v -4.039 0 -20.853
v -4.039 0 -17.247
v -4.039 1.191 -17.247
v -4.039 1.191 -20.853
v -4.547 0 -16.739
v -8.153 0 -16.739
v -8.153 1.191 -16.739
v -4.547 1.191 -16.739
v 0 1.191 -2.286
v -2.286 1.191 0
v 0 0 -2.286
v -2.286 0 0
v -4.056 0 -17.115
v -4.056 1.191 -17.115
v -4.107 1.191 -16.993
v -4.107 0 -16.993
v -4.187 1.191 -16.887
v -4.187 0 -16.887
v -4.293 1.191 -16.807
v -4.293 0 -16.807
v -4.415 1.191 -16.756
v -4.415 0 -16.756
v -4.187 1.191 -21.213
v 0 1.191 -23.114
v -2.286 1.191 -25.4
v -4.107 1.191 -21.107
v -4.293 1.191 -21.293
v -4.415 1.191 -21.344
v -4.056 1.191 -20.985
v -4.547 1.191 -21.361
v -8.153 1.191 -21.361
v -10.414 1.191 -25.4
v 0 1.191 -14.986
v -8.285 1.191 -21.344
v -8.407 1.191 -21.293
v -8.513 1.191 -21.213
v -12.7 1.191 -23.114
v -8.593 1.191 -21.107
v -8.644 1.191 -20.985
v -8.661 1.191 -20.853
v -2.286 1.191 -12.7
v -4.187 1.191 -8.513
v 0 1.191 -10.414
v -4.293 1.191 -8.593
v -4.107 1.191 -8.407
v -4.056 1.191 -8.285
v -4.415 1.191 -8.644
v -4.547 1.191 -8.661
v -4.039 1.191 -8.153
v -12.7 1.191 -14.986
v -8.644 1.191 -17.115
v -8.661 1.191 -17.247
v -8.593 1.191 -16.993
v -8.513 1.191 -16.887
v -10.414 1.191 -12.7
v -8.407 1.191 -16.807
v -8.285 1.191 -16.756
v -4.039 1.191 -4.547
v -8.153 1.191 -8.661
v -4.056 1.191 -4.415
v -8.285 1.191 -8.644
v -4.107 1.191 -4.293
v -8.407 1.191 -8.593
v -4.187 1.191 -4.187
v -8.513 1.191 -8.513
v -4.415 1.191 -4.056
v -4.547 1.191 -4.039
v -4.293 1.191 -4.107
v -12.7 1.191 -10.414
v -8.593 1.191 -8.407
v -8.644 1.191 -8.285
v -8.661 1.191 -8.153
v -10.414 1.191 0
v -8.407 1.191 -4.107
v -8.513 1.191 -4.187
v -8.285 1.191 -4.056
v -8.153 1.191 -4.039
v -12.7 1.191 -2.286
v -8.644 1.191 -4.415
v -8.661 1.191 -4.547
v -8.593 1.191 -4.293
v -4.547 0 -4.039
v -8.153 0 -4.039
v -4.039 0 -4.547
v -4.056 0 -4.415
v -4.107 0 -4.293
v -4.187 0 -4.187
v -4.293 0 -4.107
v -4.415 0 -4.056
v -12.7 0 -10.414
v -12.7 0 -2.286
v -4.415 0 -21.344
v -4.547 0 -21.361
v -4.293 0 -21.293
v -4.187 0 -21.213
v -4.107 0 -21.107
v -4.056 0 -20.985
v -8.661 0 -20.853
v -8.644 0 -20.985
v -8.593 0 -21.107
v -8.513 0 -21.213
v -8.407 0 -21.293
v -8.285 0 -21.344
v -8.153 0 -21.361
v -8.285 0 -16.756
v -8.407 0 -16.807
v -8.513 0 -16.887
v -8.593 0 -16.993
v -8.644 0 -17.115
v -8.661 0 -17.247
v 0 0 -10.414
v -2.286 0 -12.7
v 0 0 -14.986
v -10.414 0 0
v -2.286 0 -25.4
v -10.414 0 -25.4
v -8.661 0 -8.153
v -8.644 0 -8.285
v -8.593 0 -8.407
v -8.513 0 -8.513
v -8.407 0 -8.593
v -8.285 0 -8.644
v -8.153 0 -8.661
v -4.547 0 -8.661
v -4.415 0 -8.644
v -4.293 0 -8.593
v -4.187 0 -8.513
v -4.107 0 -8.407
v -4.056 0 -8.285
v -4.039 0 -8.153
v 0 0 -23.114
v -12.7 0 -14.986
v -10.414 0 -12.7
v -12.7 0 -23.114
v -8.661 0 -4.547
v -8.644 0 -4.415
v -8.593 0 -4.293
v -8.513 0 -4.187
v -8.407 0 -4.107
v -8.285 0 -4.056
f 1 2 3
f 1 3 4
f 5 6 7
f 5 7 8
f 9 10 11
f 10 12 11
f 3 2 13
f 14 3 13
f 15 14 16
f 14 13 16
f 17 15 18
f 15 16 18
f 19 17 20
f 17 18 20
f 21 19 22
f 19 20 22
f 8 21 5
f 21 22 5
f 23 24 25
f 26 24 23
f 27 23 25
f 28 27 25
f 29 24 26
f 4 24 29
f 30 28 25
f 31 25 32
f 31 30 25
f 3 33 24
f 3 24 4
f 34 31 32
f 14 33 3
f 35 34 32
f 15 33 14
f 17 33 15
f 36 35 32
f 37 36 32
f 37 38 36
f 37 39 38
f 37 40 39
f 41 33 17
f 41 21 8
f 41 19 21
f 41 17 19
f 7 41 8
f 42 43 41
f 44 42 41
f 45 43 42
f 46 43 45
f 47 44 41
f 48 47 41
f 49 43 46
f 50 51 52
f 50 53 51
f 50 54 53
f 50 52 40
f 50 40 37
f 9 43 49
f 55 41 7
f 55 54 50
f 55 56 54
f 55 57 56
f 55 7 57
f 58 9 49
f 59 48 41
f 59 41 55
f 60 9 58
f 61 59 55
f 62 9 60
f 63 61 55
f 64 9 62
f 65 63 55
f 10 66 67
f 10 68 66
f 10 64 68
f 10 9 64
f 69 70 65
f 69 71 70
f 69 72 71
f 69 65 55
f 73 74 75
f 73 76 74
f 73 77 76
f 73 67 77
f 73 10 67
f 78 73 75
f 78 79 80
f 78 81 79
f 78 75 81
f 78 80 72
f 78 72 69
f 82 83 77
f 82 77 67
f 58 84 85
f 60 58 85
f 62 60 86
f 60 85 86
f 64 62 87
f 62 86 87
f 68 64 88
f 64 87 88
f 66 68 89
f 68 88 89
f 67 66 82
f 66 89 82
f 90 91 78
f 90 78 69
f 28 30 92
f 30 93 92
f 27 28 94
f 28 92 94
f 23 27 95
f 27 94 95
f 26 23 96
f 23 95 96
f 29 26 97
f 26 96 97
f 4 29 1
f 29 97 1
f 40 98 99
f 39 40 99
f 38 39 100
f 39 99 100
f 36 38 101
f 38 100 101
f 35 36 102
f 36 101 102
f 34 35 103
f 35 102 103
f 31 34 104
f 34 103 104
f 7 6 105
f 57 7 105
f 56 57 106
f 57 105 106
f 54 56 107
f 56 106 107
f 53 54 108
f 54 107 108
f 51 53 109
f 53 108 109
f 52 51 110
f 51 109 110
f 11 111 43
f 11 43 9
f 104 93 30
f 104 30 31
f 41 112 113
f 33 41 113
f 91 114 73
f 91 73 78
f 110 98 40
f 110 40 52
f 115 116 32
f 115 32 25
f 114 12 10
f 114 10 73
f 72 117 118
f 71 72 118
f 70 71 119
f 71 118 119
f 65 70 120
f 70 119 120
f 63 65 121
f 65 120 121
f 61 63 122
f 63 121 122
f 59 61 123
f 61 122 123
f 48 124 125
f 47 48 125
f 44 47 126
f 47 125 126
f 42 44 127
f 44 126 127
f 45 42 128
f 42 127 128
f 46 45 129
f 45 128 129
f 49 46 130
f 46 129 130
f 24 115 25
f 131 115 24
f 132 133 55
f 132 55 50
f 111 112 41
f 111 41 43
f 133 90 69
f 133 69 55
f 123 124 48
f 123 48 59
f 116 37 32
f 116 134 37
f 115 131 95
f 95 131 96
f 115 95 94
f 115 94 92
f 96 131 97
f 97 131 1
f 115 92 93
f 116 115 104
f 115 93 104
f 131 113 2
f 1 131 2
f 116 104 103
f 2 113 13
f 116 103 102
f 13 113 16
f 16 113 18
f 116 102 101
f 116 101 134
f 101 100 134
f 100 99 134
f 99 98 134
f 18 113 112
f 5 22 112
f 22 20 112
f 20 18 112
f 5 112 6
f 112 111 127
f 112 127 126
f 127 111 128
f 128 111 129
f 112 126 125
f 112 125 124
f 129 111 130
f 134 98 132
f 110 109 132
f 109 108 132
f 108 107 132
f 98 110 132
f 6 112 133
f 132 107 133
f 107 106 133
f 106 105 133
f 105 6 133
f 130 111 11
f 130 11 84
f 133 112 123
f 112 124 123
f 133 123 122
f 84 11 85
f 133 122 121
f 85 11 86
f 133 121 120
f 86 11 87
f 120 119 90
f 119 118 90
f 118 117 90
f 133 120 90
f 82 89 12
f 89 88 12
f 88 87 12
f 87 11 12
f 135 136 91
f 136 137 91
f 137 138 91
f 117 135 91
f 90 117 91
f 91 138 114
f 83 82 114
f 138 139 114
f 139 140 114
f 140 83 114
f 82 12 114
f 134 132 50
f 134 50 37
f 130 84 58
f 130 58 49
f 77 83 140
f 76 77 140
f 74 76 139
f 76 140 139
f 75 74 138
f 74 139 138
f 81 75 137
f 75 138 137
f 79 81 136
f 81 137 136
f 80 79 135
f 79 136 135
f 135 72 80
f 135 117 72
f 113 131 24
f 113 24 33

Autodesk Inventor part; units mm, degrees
ref_plane "YZ Plane" through (0, 0, 0) normal (1, 0, 0) x (0, 1, 0)
ref_plane "XZ Plane" through (0, 0, 0) normal (0, 1, 0) x (-1, 0, 0)
ref_plane "XY Plane" through (0, 0, 0) normal (0, 0, 1) x (1, 0, 0)
sketch "Sketch1" plane through (0, 0, 0) normal (0, 1, 0) x (-1, 0, 0)
  line L0 (2.286, 0) -> (10.414, 0)
  line L1 (12.7, -2.286) -> (12.7, -10.414)
  line L2 (10.414, -12.7) -> (2.286, -12.7)
  line L3 (0, -10.414) -> (0, -2.286)
  line L4 (8.1534, -4.0386) -> (4.5466, -4.0386)
  line L5 (4.0386, -4.5466) -> (4.0386, -8.1534)
  line L6 (4.5466, -8.6614) -> (8.1534, -8.6614)
  line L7 (8.6614, -8.1534) -> (8.6614, -4.5466)
  line L8 (10.414, 0) -> (12.7, -2.286)
  line L9 (12.7, -10.414) -> (10.414, -12.7)
  line L10 (2.286, -12.7) -> (0, -10.414)
  line L11 (2.286, 0) -> (0, -2.286)
  arc A0 (8.6614, -4.5466) -> (8.1534, -4.0386) centre (8.1534, -4.5466) ccw
  arc A1 (8.1534, -8.6614) -> (8.6614, -8.1534) centre (8.1534, -8.1534) ccw
  arc A2 (4.0386, -8.1534) -> (4.5466, -8.6614) centre (4.5466, -8.1534) ccw
  arc A3 (4.5466, -4.0386) -> (4.0386, -4.5466) centre (4.5466, -4.5466) ccw
  line L12 (8.1534, -4.5466) -> (4.5466, -8.1534) construction
  line L13 (12.7, -10.414) -> (0, -2.286) construction
  point P0 (0, 0)
  point P1 (12.7, -12.7)
  point P2 (12.7, 0)
  point P3 (0, -12.7)
  point P4 (4.0386, -8.6614)
  point P5 (8.6614, -8.6614)
  point P6 (6.35, -6.35)
  dimension "d1" = 12.7
  dimension "d2" = 4.6228
  dimension "d3" = 2.286
  dimension "d4" = 2.286
  dimension "d5" = 2.286
  dimension "d6" = 2.286
  dimension "d7" = 2.286
  dimension "d8" = 2.286
  dimension "d9" = 2.286
  dimension "d10" = 2.286
  dimension "d11" = 0.508
extrude "Body" add sketch "Sketch1" along normal blind 1.1906
sketch "Sketch2" plane through (0, 1.1906, 0) normal (0, 1, 0) x (1, 0, 0)
  arc A0 (-8.1534, 8.6614) -> (-8.6614, 8.1534) centre (-8.1534, 8.1534) ccw construction
  arc A1 (-4.5466, 4.0386) -> (-4.0386, 4.5466) centre (-4.5466, 4.5466) ccw construction
  circle A2 centre (-6.35, 6.35) radius 2.1844
  line L0 (-8.1534, 8.1534) -> (-4.5466, 4.5466) construction
  point P0 (0, 0)
  dimension "d14" = 4.3688
surface extrude "Circle" sketch "Sketch2" against normal up to surface (1.1906 mm away) shown yes curves A2
pattern_linear "Rectangular Pattern1" count 2 spacing 12.7 along (0, 0, -1) of "Body", "Circle"
equation "\"d4\" = d3"
equation "\"d5\" = d3"
equation "\"d6\" = d5"
equation "\"d7\" = d3"
equation "\"d8\" = d7"
equation "\"d9\" = d3"
equation "\"d10\" = d9"
equation "\"d22\" = d19"
equation "\"d19\" = 12.7"
